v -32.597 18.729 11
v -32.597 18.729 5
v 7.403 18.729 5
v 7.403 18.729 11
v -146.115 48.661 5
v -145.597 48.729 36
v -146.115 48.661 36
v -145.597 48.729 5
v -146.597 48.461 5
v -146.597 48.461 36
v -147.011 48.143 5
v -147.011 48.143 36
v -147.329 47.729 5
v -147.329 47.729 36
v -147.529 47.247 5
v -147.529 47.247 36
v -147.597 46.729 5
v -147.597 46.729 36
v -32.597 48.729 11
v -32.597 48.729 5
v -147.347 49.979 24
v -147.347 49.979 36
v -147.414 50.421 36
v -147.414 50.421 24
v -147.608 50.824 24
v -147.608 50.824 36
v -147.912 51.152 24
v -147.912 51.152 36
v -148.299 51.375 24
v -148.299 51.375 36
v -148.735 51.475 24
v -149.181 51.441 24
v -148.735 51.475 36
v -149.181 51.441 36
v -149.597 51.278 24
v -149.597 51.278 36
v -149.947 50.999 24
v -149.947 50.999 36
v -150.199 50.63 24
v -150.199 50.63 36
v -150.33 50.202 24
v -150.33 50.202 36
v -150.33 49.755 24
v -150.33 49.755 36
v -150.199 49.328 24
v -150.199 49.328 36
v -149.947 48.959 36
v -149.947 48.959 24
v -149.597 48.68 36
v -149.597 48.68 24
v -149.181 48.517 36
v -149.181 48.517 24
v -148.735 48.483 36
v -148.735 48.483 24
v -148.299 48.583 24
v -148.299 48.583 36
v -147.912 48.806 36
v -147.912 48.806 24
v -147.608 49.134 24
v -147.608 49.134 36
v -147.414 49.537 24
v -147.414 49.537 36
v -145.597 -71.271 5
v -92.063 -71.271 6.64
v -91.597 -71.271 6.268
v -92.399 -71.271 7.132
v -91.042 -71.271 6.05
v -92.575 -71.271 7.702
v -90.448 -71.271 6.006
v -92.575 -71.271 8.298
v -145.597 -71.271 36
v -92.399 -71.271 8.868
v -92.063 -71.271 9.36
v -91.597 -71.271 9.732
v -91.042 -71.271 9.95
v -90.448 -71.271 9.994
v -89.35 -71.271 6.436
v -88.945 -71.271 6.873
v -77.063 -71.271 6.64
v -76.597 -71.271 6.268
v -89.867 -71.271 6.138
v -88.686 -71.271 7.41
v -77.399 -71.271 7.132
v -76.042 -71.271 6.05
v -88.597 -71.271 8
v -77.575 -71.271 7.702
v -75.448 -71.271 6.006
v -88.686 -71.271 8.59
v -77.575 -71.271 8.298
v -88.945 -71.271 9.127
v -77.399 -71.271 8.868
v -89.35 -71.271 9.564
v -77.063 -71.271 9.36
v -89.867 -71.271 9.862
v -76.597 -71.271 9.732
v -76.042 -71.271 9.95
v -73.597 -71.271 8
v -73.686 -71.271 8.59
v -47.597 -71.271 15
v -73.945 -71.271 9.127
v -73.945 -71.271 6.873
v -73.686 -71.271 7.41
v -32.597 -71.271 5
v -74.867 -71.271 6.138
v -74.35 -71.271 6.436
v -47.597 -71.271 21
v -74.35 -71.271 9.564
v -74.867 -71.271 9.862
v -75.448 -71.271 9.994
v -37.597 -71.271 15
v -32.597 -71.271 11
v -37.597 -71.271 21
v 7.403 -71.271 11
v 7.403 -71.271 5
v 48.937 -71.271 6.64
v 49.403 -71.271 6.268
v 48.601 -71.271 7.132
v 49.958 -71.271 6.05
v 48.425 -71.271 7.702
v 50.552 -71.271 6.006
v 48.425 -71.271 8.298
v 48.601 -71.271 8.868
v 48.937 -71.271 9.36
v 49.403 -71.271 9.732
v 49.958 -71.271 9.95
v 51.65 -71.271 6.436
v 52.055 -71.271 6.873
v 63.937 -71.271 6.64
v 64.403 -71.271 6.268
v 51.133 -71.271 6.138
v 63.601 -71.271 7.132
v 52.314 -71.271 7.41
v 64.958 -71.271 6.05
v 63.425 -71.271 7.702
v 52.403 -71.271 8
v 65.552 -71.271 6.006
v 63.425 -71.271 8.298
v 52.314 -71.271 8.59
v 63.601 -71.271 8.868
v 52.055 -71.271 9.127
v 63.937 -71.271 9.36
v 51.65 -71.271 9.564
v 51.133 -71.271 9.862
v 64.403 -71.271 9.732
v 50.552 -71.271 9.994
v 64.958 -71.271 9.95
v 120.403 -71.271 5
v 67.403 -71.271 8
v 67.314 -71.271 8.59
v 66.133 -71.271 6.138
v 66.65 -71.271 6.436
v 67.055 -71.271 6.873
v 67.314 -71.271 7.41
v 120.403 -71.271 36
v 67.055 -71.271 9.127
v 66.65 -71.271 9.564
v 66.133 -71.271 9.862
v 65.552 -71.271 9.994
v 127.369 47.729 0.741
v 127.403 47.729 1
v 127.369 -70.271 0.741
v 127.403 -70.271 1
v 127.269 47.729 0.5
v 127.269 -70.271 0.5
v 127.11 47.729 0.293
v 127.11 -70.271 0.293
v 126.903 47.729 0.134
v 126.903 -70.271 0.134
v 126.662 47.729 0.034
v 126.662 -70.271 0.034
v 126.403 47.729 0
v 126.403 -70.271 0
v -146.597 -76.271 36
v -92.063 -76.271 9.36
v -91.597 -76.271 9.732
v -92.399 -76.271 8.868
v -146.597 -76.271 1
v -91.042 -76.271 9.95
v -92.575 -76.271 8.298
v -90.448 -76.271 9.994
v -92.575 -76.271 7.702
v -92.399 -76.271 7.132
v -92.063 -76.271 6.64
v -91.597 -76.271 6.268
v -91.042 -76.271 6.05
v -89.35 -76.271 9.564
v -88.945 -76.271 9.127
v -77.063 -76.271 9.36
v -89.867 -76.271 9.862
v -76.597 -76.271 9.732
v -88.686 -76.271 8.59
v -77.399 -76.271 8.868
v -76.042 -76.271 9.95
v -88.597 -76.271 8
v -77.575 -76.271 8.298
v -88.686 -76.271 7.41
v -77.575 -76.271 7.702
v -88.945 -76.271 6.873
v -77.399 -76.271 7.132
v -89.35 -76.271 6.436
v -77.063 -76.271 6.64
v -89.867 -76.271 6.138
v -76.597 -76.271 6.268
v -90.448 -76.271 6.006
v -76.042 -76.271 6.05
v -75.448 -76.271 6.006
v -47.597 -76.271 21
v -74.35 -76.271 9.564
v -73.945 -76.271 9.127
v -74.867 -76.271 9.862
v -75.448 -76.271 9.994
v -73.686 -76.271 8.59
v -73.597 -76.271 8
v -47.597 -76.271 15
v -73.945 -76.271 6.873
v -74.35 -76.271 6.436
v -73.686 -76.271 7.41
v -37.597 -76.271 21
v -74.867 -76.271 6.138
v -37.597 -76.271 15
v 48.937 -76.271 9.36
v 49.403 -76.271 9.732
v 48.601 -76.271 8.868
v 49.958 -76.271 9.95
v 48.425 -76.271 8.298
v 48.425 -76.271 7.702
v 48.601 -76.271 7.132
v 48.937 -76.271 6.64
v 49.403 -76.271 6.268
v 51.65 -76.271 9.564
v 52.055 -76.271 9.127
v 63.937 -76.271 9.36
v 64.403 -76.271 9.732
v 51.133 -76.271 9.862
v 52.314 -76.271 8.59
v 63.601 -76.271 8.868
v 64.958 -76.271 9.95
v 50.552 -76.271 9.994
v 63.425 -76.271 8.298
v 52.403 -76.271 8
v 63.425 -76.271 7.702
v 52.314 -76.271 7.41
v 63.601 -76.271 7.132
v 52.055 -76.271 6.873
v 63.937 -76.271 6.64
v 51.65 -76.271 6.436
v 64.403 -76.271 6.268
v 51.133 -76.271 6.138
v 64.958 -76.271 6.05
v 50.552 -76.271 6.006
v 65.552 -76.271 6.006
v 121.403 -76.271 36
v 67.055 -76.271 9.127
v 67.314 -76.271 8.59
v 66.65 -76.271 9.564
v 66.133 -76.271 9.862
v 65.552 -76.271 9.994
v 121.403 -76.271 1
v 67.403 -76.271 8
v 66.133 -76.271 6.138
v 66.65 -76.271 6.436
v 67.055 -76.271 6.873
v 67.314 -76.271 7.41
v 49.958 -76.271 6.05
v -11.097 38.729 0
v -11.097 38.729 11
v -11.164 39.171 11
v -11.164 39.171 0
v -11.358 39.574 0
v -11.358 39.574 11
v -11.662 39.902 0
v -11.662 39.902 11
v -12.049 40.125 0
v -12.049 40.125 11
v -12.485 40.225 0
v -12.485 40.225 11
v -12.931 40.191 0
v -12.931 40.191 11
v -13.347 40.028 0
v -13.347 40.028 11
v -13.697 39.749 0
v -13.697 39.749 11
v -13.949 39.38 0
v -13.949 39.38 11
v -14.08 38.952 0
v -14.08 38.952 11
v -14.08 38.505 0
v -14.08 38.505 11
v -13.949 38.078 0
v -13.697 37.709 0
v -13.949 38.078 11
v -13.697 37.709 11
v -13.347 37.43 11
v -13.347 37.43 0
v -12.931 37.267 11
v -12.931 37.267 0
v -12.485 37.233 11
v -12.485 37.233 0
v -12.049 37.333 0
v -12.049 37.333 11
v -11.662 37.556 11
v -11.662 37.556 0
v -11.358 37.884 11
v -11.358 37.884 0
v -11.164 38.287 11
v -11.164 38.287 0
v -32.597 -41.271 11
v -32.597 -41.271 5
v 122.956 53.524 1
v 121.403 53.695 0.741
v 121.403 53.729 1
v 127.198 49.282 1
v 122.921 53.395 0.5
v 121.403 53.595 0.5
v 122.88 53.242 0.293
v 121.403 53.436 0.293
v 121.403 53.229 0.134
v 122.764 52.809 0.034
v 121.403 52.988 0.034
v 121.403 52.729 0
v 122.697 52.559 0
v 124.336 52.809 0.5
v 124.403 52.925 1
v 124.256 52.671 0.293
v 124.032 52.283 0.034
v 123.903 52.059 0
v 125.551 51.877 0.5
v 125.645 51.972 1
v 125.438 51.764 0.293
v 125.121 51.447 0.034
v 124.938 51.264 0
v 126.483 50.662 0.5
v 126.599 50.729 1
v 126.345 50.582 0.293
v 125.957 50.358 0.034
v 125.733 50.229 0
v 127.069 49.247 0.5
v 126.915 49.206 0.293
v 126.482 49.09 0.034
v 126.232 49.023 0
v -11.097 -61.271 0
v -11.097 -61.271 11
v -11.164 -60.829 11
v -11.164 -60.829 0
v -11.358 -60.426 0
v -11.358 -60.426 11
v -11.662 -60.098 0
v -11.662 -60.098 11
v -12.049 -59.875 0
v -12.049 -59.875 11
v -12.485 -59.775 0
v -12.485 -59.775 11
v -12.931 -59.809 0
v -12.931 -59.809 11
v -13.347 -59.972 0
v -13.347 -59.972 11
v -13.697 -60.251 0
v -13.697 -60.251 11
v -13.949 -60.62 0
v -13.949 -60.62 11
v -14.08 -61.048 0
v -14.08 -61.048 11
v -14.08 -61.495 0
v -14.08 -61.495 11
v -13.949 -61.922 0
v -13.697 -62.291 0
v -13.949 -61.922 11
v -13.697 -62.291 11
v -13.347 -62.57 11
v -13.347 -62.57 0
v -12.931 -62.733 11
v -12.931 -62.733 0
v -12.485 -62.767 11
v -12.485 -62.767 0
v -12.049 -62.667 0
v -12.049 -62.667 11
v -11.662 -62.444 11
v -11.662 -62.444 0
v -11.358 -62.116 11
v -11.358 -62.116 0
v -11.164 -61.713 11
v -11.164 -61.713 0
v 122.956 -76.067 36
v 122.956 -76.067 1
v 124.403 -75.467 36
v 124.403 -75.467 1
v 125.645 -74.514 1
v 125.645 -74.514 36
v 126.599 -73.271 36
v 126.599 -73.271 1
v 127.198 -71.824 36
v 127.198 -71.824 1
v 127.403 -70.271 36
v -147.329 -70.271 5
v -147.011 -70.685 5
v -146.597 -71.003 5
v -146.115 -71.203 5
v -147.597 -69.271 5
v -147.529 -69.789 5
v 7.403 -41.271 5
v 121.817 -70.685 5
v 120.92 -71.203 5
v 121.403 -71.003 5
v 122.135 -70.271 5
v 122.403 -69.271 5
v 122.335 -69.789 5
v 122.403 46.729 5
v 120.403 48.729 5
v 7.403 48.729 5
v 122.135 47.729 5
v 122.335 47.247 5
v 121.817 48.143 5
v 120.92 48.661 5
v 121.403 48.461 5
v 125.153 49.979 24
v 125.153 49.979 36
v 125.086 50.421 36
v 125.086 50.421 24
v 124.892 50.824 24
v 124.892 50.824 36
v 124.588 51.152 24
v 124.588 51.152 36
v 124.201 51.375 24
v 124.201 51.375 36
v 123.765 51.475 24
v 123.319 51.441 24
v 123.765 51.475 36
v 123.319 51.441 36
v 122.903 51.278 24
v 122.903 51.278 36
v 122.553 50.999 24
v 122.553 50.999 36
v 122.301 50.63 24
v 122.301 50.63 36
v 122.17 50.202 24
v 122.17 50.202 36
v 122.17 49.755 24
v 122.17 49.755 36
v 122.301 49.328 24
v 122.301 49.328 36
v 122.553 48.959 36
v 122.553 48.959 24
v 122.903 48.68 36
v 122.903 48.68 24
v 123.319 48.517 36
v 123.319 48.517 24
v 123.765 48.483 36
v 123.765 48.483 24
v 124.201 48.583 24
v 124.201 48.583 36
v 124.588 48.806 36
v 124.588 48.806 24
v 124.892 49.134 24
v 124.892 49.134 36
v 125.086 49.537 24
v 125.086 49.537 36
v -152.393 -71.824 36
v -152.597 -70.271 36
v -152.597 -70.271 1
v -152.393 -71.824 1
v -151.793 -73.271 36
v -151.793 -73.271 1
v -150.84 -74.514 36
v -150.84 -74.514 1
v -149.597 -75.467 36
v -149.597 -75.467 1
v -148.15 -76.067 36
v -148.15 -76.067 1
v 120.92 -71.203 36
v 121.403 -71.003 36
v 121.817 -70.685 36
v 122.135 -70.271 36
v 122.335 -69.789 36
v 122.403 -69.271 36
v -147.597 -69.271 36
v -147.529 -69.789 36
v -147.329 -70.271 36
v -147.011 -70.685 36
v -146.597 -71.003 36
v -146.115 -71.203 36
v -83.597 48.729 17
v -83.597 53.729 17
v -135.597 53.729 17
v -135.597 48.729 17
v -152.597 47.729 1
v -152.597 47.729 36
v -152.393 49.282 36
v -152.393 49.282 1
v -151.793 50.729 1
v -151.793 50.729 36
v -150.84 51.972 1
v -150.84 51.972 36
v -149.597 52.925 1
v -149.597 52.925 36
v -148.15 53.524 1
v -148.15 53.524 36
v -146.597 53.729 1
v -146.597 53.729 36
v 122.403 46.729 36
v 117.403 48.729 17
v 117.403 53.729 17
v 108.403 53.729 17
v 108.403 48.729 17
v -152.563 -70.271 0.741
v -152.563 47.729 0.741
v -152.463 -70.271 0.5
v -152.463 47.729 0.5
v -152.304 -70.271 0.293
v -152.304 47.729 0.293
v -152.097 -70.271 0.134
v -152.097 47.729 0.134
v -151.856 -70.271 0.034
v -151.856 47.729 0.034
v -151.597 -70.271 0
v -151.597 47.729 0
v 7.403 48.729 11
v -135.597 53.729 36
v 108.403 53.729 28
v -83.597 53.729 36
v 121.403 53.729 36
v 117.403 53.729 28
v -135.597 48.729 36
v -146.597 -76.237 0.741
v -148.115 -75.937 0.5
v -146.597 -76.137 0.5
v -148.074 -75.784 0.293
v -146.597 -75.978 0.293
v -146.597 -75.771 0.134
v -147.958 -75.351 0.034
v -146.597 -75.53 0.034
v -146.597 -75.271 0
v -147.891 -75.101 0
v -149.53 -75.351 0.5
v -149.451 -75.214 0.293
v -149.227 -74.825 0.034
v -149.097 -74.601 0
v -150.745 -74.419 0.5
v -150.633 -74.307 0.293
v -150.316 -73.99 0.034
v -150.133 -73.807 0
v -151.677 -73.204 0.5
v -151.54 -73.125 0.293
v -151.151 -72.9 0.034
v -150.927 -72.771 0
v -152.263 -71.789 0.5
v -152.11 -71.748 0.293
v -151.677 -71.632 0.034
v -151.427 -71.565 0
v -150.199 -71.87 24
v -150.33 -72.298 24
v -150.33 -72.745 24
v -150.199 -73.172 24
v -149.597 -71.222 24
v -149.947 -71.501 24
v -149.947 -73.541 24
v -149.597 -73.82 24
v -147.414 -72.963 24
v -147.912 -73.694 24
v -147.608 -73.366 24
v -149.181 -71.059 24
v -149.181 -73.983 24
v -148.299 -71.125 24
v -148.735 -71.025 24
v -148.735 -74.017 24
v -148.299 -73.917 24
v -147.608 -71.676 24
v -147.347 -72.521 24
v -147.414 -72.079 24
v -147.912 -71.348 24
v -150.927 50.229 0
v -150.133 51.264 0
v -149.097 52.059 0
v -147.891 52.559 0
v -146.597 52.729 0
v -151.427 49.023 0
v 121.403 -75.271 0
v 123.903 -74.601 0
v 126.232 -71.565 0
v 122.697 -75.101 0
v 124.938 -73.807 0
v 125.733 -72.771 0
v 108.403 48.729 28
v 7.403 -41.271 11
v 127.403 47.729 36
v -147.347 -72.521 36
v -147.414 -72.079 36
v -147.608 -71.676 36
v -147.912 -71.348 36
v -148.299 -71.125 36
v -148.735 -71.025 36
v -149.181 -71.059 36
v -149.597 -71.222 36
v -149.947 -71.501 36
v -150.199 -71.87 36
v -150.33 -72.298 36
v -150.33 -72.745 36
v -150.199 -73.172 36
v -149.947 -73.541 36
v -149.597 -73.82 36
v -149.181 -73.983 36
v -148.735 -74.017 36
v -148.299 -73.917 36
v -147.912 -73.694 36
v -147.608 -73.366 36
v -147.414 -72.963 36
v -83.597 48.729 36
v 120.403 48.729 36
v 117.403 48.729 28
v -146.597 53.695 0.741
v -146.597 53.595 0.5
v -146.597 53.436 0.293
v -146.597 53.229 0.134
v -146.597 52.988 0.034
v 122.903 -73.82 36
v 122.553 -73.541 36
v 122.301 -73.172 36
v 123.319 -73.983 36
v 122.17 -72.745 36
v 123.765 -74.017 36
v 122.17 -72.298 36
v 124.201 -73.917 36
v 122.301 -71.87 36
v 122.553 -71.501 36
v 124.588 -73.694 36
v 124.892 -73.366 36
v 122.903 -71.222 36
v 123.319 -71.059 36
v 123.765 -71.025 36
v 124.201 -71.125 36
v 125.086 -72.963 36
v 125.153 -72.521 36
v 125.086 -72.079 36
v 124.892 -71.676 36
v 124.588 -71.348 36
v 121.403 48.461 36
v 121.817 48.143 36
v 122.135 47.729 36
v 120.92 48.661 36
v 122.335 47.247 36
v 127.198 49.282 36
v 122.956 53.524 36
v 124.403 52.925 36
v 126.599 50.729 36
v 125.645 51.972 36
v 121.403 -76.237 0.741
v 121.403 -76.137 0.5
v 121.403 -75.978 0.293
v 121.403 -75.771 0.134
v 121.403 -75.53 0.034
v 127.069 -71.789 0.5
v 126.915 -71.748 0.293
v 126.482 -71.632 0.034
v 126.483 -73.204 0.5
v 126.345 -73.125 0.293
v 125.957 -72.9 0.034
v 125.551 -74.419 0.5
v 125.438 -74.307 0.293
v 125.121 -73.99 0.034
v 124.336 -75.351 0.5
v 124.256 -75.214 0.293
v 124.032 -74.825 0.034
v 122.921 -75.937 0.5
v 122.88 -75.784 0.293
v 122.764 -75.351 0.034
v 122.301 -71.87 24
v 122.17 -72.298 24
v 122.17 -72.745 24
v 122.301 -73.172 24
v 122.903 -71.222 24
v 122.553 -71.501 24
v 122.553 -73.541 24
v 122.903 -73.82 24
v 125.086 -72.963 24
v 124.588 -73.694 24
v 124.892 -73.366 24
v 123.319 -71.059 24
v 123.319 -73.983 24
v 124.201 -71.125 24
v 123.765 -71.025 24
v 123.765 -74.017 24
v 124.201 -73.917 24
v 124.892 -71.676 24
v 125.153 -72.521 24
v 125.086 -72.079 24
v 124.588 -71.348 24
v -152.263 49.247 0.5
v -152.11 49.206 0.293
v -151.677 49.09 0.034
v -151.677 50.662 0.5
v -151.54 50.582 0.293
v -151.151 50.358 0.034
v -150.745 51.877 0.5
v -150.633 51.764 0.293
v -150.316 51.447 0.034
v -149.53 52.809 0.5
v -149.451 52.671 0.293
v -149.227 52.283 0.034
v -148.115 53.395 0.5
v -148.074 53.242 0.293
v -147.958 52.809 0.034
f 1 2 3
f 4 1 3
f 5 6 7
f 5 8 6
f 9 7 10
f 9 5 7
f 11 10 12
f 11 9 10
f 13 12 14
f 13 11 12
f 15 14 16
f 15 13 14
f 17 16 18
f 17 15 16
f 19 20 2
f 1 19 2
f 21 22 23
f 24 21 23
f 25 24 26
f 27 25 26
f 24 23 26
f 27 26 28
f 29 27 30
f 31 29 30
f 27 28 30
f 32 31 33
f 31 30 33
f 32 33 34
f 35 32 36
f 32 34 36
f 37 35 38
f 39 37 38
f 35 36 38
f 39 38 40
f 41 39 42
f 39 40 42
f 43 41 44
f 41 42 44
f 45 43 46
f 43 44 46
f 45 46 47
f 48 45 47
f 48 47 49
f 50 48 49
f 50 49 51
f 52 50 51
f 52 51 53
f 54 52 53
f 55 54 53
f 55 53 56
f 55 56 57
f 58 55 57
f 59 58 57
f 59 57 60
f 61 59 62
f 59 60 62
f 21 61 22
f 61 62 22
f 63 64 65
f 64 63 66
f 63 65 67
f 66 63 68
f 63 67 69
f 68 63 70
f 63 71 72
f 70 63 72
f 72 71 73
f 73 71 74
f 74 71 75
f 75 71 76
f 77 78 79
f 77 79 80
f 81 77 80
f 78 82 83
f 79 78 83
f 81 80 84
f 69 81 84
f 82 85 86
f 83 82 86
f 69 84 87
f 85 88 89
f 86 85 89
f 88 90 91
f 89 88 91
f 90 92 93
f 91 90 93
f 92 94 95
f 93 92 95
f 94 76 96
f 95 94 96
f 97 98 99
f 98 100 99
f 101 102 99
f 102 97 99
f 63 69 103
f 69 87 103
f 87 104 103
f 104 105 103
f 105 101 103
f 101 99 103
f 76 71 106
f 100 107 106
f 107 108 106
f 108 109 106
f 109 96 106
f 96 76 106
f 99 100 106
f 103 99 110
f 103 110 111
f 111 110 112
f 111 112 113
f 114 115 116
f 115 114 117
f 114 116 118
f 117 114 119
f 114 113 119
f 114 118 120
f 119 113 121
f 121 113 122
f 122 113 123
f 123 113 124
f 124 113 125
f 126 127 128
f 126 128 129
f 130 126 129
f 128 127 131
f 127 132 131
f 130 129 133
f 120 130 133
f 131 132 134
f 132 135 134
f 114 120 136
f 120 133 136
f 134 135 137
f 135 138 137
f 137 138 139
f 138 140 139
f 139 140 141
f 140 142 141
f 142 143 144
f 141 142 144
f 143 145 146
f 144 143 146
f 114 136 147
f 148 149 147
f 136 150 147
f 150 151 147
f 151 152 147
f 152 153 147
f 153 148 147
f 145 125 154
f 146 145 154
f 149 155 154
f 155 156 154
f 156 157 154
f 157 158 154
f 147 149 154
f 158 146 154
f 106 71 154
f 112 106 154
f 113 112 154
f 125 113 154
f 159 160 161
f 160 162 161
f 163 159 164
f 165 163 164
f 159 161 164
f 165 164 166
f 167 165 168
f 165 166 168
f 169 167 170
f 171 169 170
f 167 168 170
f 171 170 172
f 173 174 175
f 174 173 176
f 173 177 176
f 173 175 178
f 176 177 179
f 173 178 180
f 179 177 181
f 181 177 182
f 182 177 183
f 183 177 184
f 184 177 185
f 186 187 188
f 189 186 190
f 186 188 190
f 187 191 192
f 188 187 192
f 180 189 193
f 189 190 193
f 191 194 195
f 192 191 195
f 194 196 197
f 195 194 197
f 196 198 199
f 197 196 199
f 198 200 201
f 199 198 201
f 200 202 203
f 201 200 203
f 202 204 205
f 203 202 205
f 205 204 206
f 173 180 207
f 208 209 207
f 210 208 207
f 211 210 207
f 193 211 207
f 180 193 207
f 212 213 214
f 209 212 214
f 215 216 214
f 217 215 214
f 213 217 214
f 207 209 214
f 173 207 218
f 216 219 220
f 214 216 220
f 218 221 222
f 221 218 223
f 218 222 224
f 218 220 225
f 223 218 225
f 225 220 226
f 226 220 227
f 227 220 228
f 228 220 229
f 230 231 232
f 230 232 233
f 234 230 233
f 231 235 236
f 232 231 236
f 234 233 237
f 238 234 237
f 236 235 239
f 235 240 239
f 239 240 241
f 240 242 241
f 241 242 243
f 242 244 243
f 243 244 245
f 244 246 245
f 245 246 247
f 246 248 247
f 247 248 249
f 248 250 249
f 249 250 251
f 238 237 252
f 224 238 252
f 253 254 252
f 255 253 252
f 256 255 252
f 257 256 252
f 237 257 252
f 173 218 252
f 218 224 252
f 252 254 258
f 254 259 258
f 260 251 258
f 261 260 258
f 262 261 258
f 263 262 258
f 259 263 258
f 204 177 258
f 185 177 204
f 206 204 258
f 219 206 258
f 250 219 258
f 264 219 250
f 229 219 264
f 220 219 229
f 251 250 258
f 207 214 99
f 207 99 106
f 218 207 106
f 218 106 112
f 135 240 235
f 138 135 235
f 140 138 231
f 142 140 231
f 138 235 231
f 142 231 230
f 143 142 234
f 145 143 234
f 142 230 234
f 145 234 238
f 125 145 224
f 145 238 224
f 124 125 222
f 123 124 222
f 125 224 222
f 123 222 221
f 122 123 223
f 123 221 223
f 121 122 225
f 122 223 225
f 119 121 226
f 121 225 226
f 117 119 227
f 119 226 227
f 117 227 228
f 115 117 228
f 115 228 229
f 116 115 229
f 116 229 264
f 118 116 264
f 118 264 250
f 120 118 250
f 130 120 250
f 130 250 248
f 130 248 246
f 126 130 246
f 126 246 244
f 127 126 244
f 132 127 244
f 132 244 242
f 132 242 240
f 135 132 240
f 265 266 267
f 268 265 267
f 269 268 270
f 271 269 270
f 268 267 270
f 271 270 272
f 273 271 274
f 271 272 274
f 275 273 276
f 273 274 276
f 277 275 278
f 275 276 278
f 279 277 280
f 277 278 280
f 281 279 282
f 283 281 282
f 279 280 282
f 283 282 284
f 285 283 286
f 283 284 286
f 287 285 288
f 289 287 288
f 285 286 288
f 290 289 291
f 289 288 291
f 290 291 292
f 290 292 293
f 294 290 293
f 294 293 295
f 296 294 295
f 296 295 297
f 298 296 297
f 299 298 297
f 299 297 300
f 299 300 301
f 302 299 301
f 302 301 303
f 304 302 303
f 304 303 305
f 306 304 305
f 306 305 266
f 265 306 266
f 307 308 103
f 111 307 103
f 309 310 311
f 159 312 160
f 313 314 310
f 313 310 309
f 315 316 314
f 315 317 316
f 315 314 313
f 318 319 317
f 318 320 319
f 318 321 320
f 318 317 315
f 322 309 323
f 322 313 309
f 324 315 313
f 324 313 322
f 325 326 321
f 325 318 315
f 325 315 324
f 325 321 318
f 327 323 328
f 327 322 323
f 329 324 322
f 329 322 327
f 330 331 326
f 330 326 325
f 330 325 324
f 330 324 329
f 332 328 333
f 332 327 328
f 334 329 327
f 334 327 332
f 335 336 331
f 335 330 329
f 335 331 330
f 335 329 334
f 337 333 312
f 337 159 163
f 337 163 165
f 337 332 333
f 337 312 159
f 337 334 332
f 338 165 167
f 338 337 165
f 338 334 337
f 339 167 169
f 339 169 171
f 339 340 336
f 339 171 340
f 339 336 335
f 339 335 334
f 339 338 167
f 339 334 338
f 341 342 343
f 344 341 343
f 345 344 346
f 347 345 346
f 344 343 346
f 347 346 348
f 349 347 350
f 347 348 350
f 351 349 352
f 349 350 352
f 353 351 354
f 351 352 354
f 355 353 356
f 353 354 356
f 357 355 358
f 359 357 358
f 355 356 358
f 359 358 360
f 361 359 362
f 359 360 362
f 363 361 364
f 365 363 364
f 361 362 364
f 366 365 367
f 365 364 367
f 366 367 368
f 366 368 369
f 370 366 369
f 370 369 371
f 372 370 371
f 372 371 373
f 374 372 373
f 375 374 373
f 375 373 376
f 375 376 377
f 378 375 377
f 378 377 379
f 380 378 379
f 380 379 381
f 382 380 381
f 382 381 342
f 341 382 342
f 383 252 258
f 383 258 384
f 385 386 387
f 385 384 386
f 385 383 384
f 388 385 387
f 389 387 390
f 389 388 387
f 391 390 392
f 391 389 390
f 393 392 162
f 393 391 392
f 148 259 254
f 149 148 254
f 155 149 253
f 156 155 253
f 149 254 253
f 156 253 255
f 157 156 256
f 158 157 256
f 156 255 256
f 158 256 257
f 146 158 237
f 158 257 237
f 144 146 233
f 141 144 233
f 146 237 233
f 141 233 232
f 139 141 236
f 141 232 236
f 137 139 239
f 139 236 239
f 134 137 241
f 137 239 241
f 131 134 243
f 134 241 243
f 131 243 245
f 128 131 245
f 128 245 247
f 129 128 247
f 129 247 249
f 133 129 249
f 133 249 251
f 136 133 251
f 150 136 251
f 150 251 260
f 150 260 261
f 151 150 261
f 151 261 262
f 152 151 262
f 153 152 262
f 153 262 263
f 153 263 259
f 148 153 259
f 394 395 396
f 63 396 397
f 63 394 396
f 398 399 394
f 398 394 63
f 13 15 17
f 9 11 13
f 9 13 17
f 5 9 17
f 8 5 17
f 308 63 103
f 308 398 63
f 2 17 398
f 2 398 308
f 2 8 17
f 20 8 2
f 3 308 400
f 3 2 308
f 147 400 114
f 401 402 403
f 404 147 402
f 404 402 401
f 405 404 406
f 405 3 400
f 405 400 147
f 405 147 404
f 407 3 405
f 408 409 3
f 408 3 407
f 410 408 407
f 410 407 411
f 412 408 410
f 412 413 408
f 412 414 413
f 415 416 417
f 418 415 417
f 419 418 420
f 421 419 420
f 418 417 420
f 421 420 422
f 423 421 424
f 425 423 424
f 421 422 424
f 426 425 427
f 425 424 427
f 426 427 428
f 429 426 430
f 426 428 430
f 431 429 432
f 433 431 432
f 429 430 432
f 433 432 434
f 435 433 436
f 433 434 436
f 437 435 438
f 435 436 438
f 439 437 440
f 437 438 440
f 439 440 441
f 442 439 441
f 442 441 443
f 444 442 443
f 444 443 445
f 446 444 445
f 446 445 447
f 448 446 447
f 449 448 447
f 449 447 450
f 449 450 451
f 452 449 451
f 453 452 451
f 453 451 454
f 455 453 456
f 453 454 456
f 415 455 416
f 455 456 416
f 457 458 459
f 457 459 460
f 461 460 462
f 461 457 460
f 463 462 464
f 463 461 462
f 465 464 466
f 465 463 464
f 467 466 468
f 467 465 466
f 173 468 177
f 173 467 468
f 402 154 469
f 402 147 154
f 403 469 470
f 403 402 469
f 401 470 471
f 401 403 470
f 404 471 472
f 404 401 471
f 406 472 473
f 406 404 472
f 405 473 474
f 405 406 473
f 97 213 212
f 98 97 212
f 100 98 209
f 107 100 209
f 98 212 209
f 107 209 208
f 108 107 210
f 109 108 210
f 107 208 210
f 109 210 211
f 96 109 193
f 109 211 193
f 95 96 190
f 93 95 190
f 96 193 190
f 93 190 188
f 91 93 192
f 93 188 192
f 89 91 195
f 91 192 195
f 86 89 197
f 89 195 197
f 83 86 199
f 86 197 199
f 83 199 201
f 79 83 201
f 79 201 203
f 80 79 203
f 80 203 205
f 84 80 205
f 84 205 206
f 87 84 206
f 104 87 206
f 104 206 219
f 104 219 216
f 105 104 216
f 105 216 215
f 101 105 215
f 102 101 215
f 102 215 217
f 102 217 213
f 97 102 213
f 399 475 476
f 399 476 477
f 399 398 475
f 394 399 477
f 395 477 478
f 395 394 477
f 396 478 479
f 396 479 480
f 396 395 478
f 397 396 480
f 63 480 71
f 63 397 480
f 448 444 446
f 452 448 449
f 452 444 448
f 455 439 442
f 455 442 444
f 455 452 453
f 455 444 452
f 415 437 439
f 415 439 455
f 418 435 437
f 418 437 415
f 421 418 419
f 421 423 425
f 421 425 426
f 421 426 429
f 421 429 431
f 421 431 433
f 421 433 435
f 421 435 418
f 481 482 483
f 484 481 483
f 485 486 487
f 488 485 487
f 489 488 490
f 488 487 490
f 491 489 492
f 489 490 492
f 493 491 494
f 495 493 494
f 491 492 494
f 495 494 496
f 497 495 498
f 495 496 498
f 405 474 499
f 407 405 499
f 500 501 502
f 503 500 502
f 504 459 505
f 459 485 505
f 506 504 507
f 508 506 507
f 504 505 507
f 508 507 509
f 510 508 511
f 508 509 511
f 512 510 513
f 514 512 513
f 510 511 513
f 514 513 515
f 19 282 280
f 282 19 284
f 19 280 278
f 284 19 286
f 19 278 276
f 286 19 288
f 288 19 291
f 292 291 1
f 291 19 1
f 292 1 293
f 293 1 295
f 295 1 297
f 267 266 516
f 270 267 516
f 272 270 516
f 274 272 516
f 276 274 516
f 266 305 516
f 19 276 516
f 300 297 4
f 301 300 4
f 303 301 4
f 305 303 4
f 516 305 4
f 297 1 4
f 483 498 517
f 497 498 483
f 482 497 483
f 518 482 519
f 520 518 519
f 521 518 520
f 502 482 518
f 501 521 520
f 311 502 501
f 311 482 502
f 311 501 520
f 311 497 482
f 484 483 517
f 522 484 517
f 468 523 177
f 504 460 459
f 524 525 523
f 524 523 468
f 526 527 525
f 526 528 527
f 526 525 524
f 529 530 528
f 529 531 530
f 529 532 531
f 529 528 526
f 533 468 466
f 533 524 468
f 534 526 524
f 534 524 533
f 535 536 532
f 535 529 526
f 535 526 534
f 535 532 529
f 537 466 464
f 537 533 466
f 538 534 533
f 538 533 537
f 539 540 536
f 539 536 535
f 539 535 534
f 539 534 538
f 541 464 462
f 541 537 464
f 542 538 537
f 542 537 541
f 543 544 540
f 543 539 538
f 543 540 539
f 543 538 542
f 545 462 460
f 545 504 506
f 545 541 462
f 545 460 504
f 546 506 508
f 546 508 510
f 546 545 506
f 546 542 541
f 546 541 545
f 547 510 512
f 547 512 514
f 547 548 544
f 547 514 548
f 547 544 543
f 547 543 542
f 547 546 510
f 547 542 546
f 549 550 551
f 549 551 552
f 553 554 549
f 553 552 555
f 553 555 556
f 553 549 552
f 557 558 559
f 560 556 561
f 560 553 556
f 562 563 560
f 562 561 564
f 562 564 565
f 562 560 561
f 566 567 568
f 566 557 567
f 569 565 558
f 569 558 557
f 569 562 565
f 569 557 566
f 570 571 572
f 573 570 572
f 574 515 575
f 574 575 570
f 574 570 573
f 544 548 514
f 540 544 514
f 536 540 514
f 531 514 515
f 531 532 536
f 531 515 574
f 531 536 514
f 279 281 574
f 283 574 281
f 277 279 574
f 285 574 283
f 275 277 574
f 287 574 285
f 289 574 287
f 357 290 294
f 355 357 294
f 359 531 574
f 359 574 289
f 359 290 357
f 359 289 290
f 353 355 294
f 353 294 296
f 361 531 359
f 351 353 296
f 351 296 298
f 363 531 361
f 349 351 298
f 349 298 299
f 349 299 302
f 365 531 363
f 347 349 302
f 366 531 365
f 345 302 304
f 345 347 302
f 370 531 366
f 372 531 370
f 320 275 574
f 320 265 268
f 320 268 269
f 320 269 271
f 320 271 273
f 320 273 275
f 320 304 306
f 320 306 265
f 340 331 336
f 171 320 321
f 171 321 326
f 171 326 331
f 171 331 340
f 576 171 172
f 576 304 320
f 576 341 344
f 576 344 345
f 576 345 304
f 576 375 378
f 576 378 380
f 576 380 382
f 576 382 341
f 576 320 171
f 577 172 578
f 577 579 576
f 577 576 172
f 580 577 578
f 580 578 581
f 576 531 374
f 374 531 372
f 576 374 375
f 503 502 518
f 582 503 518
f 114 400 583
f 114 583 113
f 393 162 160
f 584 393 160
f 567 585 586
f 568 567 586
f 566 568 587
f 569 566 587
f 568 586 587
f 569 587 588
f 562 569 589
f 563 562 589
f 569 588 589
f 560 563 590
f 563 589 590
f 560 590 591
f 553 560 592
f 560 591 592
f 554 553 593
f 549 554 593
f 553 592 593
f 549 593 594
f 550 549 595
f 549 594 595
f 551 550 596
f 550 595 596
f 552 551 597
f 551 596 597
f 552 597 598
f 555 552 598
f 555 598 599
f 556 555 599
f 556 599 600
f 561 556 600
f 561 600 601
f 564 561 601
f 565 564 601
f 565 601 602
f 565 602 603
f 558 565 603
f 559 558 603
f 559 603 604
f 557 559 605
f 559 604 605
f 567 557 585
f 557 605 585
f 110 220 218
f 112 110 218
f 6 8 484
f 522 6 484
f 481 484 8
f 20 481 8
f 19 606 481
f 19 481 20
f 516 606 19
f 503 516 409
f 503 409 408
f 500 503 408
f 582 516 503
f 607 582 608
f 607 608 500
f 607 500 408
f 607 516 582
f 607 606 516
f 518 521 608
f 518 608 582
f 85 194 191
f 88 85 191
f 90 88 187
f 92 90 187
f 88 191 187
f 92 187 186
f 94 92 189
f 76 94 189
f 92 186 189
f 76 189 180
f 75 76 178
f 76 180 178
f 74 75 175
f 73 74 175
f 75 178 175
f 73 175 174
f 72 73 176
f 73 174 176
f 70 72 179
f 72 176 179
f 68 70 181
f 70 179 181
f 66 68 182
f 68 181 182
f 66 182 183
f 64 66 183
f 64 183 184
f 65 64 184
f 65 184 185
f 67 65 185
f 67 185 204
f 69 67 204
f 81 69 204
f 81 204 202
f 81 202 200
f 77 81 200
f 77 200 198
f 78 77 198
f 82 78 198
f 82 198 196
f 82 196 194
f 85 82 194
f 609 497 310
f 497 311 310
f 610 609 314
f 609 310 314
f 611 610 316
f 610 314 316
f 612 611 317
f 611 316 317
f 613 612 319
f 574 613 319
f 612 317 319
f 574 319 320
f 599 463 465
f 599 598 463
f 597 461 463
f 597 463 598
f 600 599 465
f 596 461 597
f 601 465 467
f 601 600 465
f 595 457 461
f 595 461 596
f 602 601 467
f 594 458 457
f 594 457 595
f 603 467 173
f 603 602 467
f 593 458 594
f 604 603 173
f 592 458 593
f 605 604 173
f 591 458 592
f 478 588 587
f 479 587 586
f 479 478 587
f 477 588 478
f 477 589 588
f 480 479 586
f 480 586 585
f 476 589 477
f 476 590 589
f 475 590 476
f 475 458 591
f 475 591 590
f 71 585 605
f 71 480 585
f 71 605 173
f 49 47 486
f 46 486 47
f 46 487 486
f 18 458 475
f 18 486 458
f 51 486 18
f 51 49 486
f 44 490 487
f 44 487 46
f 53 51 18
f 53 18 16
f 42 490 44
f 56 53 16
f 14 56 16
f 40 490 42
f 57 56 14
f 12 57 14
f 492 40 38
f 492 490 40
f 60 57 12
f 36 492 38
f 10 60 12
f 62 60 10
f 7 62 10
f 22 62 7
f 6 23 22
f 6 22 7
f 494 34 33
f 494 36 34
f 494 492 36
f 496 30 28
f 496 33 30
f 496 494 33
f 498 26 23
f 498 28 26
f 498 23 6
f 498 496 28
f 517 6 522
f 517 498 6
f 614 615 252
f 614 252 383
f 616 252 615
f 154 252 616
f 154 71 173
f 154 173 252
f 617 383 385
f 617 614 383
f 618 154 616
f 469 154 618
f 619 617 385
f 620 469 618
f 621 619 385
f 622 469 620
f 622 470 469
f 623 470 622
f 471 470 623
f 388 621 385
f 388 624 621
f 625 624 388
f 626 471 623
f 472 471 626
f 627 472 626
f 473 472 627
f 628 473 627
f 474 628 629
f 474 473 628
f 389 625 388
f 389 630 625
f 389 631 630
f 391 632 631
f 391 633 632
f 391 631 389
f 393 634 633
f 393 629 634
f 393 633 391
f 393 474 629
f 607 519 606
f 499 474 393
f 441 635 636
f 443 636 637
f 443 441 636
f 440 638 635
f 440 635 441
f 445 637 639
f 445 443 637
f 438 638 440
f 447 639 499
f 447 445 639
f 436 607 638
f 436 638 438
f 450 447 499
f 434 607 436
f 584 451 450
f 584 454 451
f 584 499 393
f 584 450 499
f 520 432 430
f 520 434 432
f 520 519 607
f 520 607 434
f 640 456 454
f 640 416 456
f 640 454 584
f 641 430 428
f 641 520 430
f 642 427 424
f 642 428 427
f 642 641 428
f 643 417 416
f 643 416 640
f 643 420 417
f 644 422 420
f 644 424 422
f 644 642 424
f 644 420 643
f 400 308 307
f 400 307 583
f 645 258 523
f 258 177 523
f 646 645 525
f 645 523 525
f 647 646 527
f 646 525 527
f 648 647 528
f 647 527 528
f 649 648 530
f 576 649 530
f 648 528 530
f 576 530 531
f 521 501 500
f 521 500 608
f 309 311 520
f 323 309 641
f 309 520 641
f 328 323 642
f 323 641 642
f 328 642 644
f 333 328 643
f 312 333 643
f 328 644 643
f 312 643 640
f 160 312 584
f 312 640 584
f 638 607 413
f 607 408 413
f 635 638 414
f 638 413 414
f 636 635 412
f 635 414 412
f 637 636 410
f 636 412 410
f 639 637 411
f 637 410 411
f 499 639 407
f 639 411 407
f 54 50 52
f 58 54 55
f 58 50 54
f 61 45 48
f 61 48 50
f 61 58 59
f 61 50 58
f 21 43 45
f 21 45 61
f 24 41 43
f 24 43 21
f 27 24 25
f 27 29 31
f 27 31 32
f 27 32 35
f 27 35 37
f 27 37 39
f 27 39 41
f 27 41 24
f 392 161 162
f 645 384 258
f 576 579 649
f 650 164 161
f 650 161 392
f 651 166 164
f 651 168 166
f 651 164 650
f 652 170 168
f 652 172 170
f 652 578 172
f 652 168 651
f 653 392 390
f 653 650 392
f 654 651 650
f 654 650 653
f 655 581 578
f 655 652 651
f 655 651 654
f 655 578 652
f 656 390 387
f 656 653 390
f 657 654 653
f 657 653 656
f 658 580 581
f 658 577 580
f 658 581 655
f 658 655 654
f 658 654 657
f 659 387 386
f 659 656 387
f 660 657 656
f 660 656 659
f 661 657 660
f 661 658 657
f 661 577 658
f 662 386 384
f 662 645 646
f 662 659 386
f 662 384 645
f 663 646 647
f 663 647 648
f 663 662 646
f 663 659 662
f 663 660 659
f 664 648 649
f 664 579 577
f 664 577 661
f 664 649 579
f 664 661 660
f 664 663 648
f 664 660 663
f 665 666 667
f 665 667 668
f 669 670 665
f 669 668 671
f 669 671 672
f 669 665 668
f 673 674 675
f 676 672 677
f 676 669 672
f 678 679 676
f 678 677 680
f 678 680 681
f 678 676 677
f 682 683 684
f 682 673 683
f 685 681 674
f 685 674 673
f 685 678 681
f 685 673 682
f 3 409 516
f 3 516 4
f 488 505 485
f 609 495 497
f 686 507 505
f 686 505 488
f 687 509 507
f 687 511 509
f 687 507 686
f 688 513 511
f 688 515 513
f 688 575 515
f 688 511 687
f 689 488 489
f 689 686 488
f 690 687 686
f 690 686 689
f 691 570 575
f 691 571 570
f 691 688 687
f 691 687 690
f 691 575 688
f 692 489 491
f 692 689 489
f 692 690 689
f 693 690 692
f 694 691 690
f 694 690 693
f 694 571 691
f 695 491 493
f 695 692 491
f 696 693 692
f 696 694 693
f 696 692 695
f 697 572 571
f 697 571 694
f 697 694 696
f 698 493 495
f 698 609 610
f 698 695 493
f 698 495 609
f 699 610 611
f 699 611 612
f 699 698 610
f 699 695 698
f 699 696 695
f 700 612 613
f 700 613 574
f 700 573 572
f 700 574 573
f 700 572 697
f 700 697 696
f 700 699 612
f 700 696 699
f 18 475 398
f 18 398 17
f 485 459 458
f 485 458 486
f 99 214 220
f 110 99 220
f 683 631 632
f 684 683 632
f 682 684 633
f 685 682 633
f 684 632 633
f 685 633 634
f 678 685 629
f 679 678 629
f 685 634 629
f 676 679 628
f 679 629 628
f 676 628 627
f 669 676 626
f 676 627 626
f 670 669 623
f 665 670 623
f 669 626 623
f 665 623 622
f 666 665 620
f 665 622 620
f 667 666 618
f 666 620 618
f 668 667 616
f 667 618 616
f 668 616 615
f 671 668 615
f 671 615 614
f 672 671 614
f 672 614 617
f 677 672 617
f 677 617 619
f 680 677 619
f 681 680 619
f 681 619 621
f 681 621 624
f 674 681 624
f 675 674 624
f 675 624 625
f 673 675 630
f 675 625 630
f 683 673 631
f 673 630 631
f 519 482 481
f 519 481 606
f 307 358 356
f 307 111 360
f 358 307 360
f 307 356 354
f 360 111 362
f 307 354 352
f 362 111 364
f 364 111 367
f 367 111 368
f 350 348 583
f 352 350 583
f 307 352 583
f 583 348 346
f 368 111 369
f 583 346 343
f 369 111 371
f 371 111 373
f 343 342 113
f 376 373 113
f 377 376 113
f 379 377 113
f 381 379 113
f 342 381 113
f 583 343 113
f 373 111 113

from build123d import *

# Parameters (mm, degrees)
F0_W      = 280
F0_H      = 130
F1_DEPTH  = 36
F2_W      = 270
F2_H      = 120
F3_DEPTH  = 31
F4_R      = 2
F4_W      = 10
F4_H      = 6
F6_DEPTH  = 25
F5_W      = 52
F5_H      = 19
F5_W_2    = 9
F5_H_2    = 11
F7_DEPTH  = 25
F8_W      = 40
F8_H      = 30
F9_DEPTH  = 11
F10_R     = 1.5
F11_DEPTH = 12
F12_R     = 1.5
F13_DEPTH = 12
F14_R     = 6
F15_R     = 2
F16_R     = 1


# Not quite as in the source:
# - a feature names something its author has since deleted; it is built from what else it names


with BuildPart() as f1:
    # F0 (on Top) → F1 (new body)
    with BuildSketch(Plane.XY):
        with Locations((-12.5971958935, -11.2710741152)):
            Rectangle(F0_W, F0_H)
    extrude(amount=F1_DEPTH)

    # F2 (on face) → F3 (cut)
    with BuildSketch(Plane.XY.offset(36)):
        with Locations((-12.5971958935, -11.2710741152)):
            Rectangle(F2_W, F2_H)
    extrude(amount=-F3_DEPTH, mode=Mode.SUBTRACT)

    # F4 (on face) → F6 (cut)
    with BuildSketch(Plane.XZ.offset(76.2710741152)):
        with Locations((-90.5971958935, 8)):
            Circle(F4_R)
        with Locations((-75.5971958935, 8)):
            Circle(F4_R)
        with Locations((50.4028041065, 8)):
            Circle(F4_R)
        with Locations((65.4028041065, 8)):
            Circle(F4_R)
        with Locations((-42.5971958935, 18)):
            Rectangle(F4_W, F4_H)
    extrude(amount=-F6_DEPTH, mode=Mode.SUBTRACT)

    # F5 (on face) → F7 (cut)
    with BuildSketch(Plane(origin=(0, 53.7289258848, 0), x_dir=(-1, 0, 0), z_dir=(0, 1, 0))):
        with Locations((109.5971958935, 26.5)):
            Rectangle(F5_W, F5_H)
        with Locations((-112.9028041065, 22.5)):
            Rectangle(F5_W_2, F5_H_2)
    extrude(amount=-F7_DEPTH, mode=Mode.SUBTRACT)

    # F8 (on face) → F9 (join)
    with BuildSketch(Plane(origin=(0, 0, 0), x_dir=(1, 0, 0), z_dir=(0, 0, -1))):
        with Locations((-12.5971958935, -33.7289258848)):
            Rectangle(F8_W, F8_H)
        with Locations((-12.5971958935, 56.2710741152)):
            Rectangle(F8_W, F8_H)
    extrude(amount=-F9_DEPTH)

    # F10 (on face) → F11 (cut)
    with BuildSketch(Plane.XY.offset(11)):
        with Locations((-12.5971958935, 38.7289258848)):
            Circle(F10_R)
        with Locations((-12.5971958935, -61.2710741152)):
            Circle(F10_R)
    extrude(amount=-F11_DEPTH, mode=Mode.SUBTRACT)

    # F12 (on face) → F13 (cut)
    with BuildSketch(Plane.XY.offset(36)):
        with Locations((-148.8471958935, 49.9789258848)):
            Circle(F12_R)
        with Locations((-148.8471958935, -72.5210741152)):
            Circle(F12_R)
        with Locations((123.6528041065, -72.5210741152)):
            Circle(F12_R)
        with Locations((123.6528041065, 49.9789258848)):
            Circle(F12_R)
    extrude(amount=-F13_DEPTH, mode=Mode.SUBTRACT)

    # F14
    f14_edges = [f1.edges().sort_by_distance(p)[0] for p in [
        (-152.597196, -76.271074, 18),
        (-152.597196, 53.728926, 18),
        (127.402804, -76.271074, 18),
        (127.402804, 53.728926, 18),
    ]]
    fillet(f14_edges, radius=F14_R)

    # F15
    f15_edges = [f1.edges().sort_by_distance(p)[0] for p in [
        (-147.597196, 48.728926, 20.5),
        (-147.597196, -71.271074, 20.5),
        (122.402804, 48.728926, 20.5),
        (122.402804, -71.271074, 20.5),
    ]]
    fillet(f15_edges, radius=F15_R)

    # F16
    f16_edges = [f1.edges().sort_by_distance(p)[0] for p in [
        (-152.597196, -11.271074, 0),
    ]]
    fillet(f16_edges, radius=F16_R)


solid = f1.part
